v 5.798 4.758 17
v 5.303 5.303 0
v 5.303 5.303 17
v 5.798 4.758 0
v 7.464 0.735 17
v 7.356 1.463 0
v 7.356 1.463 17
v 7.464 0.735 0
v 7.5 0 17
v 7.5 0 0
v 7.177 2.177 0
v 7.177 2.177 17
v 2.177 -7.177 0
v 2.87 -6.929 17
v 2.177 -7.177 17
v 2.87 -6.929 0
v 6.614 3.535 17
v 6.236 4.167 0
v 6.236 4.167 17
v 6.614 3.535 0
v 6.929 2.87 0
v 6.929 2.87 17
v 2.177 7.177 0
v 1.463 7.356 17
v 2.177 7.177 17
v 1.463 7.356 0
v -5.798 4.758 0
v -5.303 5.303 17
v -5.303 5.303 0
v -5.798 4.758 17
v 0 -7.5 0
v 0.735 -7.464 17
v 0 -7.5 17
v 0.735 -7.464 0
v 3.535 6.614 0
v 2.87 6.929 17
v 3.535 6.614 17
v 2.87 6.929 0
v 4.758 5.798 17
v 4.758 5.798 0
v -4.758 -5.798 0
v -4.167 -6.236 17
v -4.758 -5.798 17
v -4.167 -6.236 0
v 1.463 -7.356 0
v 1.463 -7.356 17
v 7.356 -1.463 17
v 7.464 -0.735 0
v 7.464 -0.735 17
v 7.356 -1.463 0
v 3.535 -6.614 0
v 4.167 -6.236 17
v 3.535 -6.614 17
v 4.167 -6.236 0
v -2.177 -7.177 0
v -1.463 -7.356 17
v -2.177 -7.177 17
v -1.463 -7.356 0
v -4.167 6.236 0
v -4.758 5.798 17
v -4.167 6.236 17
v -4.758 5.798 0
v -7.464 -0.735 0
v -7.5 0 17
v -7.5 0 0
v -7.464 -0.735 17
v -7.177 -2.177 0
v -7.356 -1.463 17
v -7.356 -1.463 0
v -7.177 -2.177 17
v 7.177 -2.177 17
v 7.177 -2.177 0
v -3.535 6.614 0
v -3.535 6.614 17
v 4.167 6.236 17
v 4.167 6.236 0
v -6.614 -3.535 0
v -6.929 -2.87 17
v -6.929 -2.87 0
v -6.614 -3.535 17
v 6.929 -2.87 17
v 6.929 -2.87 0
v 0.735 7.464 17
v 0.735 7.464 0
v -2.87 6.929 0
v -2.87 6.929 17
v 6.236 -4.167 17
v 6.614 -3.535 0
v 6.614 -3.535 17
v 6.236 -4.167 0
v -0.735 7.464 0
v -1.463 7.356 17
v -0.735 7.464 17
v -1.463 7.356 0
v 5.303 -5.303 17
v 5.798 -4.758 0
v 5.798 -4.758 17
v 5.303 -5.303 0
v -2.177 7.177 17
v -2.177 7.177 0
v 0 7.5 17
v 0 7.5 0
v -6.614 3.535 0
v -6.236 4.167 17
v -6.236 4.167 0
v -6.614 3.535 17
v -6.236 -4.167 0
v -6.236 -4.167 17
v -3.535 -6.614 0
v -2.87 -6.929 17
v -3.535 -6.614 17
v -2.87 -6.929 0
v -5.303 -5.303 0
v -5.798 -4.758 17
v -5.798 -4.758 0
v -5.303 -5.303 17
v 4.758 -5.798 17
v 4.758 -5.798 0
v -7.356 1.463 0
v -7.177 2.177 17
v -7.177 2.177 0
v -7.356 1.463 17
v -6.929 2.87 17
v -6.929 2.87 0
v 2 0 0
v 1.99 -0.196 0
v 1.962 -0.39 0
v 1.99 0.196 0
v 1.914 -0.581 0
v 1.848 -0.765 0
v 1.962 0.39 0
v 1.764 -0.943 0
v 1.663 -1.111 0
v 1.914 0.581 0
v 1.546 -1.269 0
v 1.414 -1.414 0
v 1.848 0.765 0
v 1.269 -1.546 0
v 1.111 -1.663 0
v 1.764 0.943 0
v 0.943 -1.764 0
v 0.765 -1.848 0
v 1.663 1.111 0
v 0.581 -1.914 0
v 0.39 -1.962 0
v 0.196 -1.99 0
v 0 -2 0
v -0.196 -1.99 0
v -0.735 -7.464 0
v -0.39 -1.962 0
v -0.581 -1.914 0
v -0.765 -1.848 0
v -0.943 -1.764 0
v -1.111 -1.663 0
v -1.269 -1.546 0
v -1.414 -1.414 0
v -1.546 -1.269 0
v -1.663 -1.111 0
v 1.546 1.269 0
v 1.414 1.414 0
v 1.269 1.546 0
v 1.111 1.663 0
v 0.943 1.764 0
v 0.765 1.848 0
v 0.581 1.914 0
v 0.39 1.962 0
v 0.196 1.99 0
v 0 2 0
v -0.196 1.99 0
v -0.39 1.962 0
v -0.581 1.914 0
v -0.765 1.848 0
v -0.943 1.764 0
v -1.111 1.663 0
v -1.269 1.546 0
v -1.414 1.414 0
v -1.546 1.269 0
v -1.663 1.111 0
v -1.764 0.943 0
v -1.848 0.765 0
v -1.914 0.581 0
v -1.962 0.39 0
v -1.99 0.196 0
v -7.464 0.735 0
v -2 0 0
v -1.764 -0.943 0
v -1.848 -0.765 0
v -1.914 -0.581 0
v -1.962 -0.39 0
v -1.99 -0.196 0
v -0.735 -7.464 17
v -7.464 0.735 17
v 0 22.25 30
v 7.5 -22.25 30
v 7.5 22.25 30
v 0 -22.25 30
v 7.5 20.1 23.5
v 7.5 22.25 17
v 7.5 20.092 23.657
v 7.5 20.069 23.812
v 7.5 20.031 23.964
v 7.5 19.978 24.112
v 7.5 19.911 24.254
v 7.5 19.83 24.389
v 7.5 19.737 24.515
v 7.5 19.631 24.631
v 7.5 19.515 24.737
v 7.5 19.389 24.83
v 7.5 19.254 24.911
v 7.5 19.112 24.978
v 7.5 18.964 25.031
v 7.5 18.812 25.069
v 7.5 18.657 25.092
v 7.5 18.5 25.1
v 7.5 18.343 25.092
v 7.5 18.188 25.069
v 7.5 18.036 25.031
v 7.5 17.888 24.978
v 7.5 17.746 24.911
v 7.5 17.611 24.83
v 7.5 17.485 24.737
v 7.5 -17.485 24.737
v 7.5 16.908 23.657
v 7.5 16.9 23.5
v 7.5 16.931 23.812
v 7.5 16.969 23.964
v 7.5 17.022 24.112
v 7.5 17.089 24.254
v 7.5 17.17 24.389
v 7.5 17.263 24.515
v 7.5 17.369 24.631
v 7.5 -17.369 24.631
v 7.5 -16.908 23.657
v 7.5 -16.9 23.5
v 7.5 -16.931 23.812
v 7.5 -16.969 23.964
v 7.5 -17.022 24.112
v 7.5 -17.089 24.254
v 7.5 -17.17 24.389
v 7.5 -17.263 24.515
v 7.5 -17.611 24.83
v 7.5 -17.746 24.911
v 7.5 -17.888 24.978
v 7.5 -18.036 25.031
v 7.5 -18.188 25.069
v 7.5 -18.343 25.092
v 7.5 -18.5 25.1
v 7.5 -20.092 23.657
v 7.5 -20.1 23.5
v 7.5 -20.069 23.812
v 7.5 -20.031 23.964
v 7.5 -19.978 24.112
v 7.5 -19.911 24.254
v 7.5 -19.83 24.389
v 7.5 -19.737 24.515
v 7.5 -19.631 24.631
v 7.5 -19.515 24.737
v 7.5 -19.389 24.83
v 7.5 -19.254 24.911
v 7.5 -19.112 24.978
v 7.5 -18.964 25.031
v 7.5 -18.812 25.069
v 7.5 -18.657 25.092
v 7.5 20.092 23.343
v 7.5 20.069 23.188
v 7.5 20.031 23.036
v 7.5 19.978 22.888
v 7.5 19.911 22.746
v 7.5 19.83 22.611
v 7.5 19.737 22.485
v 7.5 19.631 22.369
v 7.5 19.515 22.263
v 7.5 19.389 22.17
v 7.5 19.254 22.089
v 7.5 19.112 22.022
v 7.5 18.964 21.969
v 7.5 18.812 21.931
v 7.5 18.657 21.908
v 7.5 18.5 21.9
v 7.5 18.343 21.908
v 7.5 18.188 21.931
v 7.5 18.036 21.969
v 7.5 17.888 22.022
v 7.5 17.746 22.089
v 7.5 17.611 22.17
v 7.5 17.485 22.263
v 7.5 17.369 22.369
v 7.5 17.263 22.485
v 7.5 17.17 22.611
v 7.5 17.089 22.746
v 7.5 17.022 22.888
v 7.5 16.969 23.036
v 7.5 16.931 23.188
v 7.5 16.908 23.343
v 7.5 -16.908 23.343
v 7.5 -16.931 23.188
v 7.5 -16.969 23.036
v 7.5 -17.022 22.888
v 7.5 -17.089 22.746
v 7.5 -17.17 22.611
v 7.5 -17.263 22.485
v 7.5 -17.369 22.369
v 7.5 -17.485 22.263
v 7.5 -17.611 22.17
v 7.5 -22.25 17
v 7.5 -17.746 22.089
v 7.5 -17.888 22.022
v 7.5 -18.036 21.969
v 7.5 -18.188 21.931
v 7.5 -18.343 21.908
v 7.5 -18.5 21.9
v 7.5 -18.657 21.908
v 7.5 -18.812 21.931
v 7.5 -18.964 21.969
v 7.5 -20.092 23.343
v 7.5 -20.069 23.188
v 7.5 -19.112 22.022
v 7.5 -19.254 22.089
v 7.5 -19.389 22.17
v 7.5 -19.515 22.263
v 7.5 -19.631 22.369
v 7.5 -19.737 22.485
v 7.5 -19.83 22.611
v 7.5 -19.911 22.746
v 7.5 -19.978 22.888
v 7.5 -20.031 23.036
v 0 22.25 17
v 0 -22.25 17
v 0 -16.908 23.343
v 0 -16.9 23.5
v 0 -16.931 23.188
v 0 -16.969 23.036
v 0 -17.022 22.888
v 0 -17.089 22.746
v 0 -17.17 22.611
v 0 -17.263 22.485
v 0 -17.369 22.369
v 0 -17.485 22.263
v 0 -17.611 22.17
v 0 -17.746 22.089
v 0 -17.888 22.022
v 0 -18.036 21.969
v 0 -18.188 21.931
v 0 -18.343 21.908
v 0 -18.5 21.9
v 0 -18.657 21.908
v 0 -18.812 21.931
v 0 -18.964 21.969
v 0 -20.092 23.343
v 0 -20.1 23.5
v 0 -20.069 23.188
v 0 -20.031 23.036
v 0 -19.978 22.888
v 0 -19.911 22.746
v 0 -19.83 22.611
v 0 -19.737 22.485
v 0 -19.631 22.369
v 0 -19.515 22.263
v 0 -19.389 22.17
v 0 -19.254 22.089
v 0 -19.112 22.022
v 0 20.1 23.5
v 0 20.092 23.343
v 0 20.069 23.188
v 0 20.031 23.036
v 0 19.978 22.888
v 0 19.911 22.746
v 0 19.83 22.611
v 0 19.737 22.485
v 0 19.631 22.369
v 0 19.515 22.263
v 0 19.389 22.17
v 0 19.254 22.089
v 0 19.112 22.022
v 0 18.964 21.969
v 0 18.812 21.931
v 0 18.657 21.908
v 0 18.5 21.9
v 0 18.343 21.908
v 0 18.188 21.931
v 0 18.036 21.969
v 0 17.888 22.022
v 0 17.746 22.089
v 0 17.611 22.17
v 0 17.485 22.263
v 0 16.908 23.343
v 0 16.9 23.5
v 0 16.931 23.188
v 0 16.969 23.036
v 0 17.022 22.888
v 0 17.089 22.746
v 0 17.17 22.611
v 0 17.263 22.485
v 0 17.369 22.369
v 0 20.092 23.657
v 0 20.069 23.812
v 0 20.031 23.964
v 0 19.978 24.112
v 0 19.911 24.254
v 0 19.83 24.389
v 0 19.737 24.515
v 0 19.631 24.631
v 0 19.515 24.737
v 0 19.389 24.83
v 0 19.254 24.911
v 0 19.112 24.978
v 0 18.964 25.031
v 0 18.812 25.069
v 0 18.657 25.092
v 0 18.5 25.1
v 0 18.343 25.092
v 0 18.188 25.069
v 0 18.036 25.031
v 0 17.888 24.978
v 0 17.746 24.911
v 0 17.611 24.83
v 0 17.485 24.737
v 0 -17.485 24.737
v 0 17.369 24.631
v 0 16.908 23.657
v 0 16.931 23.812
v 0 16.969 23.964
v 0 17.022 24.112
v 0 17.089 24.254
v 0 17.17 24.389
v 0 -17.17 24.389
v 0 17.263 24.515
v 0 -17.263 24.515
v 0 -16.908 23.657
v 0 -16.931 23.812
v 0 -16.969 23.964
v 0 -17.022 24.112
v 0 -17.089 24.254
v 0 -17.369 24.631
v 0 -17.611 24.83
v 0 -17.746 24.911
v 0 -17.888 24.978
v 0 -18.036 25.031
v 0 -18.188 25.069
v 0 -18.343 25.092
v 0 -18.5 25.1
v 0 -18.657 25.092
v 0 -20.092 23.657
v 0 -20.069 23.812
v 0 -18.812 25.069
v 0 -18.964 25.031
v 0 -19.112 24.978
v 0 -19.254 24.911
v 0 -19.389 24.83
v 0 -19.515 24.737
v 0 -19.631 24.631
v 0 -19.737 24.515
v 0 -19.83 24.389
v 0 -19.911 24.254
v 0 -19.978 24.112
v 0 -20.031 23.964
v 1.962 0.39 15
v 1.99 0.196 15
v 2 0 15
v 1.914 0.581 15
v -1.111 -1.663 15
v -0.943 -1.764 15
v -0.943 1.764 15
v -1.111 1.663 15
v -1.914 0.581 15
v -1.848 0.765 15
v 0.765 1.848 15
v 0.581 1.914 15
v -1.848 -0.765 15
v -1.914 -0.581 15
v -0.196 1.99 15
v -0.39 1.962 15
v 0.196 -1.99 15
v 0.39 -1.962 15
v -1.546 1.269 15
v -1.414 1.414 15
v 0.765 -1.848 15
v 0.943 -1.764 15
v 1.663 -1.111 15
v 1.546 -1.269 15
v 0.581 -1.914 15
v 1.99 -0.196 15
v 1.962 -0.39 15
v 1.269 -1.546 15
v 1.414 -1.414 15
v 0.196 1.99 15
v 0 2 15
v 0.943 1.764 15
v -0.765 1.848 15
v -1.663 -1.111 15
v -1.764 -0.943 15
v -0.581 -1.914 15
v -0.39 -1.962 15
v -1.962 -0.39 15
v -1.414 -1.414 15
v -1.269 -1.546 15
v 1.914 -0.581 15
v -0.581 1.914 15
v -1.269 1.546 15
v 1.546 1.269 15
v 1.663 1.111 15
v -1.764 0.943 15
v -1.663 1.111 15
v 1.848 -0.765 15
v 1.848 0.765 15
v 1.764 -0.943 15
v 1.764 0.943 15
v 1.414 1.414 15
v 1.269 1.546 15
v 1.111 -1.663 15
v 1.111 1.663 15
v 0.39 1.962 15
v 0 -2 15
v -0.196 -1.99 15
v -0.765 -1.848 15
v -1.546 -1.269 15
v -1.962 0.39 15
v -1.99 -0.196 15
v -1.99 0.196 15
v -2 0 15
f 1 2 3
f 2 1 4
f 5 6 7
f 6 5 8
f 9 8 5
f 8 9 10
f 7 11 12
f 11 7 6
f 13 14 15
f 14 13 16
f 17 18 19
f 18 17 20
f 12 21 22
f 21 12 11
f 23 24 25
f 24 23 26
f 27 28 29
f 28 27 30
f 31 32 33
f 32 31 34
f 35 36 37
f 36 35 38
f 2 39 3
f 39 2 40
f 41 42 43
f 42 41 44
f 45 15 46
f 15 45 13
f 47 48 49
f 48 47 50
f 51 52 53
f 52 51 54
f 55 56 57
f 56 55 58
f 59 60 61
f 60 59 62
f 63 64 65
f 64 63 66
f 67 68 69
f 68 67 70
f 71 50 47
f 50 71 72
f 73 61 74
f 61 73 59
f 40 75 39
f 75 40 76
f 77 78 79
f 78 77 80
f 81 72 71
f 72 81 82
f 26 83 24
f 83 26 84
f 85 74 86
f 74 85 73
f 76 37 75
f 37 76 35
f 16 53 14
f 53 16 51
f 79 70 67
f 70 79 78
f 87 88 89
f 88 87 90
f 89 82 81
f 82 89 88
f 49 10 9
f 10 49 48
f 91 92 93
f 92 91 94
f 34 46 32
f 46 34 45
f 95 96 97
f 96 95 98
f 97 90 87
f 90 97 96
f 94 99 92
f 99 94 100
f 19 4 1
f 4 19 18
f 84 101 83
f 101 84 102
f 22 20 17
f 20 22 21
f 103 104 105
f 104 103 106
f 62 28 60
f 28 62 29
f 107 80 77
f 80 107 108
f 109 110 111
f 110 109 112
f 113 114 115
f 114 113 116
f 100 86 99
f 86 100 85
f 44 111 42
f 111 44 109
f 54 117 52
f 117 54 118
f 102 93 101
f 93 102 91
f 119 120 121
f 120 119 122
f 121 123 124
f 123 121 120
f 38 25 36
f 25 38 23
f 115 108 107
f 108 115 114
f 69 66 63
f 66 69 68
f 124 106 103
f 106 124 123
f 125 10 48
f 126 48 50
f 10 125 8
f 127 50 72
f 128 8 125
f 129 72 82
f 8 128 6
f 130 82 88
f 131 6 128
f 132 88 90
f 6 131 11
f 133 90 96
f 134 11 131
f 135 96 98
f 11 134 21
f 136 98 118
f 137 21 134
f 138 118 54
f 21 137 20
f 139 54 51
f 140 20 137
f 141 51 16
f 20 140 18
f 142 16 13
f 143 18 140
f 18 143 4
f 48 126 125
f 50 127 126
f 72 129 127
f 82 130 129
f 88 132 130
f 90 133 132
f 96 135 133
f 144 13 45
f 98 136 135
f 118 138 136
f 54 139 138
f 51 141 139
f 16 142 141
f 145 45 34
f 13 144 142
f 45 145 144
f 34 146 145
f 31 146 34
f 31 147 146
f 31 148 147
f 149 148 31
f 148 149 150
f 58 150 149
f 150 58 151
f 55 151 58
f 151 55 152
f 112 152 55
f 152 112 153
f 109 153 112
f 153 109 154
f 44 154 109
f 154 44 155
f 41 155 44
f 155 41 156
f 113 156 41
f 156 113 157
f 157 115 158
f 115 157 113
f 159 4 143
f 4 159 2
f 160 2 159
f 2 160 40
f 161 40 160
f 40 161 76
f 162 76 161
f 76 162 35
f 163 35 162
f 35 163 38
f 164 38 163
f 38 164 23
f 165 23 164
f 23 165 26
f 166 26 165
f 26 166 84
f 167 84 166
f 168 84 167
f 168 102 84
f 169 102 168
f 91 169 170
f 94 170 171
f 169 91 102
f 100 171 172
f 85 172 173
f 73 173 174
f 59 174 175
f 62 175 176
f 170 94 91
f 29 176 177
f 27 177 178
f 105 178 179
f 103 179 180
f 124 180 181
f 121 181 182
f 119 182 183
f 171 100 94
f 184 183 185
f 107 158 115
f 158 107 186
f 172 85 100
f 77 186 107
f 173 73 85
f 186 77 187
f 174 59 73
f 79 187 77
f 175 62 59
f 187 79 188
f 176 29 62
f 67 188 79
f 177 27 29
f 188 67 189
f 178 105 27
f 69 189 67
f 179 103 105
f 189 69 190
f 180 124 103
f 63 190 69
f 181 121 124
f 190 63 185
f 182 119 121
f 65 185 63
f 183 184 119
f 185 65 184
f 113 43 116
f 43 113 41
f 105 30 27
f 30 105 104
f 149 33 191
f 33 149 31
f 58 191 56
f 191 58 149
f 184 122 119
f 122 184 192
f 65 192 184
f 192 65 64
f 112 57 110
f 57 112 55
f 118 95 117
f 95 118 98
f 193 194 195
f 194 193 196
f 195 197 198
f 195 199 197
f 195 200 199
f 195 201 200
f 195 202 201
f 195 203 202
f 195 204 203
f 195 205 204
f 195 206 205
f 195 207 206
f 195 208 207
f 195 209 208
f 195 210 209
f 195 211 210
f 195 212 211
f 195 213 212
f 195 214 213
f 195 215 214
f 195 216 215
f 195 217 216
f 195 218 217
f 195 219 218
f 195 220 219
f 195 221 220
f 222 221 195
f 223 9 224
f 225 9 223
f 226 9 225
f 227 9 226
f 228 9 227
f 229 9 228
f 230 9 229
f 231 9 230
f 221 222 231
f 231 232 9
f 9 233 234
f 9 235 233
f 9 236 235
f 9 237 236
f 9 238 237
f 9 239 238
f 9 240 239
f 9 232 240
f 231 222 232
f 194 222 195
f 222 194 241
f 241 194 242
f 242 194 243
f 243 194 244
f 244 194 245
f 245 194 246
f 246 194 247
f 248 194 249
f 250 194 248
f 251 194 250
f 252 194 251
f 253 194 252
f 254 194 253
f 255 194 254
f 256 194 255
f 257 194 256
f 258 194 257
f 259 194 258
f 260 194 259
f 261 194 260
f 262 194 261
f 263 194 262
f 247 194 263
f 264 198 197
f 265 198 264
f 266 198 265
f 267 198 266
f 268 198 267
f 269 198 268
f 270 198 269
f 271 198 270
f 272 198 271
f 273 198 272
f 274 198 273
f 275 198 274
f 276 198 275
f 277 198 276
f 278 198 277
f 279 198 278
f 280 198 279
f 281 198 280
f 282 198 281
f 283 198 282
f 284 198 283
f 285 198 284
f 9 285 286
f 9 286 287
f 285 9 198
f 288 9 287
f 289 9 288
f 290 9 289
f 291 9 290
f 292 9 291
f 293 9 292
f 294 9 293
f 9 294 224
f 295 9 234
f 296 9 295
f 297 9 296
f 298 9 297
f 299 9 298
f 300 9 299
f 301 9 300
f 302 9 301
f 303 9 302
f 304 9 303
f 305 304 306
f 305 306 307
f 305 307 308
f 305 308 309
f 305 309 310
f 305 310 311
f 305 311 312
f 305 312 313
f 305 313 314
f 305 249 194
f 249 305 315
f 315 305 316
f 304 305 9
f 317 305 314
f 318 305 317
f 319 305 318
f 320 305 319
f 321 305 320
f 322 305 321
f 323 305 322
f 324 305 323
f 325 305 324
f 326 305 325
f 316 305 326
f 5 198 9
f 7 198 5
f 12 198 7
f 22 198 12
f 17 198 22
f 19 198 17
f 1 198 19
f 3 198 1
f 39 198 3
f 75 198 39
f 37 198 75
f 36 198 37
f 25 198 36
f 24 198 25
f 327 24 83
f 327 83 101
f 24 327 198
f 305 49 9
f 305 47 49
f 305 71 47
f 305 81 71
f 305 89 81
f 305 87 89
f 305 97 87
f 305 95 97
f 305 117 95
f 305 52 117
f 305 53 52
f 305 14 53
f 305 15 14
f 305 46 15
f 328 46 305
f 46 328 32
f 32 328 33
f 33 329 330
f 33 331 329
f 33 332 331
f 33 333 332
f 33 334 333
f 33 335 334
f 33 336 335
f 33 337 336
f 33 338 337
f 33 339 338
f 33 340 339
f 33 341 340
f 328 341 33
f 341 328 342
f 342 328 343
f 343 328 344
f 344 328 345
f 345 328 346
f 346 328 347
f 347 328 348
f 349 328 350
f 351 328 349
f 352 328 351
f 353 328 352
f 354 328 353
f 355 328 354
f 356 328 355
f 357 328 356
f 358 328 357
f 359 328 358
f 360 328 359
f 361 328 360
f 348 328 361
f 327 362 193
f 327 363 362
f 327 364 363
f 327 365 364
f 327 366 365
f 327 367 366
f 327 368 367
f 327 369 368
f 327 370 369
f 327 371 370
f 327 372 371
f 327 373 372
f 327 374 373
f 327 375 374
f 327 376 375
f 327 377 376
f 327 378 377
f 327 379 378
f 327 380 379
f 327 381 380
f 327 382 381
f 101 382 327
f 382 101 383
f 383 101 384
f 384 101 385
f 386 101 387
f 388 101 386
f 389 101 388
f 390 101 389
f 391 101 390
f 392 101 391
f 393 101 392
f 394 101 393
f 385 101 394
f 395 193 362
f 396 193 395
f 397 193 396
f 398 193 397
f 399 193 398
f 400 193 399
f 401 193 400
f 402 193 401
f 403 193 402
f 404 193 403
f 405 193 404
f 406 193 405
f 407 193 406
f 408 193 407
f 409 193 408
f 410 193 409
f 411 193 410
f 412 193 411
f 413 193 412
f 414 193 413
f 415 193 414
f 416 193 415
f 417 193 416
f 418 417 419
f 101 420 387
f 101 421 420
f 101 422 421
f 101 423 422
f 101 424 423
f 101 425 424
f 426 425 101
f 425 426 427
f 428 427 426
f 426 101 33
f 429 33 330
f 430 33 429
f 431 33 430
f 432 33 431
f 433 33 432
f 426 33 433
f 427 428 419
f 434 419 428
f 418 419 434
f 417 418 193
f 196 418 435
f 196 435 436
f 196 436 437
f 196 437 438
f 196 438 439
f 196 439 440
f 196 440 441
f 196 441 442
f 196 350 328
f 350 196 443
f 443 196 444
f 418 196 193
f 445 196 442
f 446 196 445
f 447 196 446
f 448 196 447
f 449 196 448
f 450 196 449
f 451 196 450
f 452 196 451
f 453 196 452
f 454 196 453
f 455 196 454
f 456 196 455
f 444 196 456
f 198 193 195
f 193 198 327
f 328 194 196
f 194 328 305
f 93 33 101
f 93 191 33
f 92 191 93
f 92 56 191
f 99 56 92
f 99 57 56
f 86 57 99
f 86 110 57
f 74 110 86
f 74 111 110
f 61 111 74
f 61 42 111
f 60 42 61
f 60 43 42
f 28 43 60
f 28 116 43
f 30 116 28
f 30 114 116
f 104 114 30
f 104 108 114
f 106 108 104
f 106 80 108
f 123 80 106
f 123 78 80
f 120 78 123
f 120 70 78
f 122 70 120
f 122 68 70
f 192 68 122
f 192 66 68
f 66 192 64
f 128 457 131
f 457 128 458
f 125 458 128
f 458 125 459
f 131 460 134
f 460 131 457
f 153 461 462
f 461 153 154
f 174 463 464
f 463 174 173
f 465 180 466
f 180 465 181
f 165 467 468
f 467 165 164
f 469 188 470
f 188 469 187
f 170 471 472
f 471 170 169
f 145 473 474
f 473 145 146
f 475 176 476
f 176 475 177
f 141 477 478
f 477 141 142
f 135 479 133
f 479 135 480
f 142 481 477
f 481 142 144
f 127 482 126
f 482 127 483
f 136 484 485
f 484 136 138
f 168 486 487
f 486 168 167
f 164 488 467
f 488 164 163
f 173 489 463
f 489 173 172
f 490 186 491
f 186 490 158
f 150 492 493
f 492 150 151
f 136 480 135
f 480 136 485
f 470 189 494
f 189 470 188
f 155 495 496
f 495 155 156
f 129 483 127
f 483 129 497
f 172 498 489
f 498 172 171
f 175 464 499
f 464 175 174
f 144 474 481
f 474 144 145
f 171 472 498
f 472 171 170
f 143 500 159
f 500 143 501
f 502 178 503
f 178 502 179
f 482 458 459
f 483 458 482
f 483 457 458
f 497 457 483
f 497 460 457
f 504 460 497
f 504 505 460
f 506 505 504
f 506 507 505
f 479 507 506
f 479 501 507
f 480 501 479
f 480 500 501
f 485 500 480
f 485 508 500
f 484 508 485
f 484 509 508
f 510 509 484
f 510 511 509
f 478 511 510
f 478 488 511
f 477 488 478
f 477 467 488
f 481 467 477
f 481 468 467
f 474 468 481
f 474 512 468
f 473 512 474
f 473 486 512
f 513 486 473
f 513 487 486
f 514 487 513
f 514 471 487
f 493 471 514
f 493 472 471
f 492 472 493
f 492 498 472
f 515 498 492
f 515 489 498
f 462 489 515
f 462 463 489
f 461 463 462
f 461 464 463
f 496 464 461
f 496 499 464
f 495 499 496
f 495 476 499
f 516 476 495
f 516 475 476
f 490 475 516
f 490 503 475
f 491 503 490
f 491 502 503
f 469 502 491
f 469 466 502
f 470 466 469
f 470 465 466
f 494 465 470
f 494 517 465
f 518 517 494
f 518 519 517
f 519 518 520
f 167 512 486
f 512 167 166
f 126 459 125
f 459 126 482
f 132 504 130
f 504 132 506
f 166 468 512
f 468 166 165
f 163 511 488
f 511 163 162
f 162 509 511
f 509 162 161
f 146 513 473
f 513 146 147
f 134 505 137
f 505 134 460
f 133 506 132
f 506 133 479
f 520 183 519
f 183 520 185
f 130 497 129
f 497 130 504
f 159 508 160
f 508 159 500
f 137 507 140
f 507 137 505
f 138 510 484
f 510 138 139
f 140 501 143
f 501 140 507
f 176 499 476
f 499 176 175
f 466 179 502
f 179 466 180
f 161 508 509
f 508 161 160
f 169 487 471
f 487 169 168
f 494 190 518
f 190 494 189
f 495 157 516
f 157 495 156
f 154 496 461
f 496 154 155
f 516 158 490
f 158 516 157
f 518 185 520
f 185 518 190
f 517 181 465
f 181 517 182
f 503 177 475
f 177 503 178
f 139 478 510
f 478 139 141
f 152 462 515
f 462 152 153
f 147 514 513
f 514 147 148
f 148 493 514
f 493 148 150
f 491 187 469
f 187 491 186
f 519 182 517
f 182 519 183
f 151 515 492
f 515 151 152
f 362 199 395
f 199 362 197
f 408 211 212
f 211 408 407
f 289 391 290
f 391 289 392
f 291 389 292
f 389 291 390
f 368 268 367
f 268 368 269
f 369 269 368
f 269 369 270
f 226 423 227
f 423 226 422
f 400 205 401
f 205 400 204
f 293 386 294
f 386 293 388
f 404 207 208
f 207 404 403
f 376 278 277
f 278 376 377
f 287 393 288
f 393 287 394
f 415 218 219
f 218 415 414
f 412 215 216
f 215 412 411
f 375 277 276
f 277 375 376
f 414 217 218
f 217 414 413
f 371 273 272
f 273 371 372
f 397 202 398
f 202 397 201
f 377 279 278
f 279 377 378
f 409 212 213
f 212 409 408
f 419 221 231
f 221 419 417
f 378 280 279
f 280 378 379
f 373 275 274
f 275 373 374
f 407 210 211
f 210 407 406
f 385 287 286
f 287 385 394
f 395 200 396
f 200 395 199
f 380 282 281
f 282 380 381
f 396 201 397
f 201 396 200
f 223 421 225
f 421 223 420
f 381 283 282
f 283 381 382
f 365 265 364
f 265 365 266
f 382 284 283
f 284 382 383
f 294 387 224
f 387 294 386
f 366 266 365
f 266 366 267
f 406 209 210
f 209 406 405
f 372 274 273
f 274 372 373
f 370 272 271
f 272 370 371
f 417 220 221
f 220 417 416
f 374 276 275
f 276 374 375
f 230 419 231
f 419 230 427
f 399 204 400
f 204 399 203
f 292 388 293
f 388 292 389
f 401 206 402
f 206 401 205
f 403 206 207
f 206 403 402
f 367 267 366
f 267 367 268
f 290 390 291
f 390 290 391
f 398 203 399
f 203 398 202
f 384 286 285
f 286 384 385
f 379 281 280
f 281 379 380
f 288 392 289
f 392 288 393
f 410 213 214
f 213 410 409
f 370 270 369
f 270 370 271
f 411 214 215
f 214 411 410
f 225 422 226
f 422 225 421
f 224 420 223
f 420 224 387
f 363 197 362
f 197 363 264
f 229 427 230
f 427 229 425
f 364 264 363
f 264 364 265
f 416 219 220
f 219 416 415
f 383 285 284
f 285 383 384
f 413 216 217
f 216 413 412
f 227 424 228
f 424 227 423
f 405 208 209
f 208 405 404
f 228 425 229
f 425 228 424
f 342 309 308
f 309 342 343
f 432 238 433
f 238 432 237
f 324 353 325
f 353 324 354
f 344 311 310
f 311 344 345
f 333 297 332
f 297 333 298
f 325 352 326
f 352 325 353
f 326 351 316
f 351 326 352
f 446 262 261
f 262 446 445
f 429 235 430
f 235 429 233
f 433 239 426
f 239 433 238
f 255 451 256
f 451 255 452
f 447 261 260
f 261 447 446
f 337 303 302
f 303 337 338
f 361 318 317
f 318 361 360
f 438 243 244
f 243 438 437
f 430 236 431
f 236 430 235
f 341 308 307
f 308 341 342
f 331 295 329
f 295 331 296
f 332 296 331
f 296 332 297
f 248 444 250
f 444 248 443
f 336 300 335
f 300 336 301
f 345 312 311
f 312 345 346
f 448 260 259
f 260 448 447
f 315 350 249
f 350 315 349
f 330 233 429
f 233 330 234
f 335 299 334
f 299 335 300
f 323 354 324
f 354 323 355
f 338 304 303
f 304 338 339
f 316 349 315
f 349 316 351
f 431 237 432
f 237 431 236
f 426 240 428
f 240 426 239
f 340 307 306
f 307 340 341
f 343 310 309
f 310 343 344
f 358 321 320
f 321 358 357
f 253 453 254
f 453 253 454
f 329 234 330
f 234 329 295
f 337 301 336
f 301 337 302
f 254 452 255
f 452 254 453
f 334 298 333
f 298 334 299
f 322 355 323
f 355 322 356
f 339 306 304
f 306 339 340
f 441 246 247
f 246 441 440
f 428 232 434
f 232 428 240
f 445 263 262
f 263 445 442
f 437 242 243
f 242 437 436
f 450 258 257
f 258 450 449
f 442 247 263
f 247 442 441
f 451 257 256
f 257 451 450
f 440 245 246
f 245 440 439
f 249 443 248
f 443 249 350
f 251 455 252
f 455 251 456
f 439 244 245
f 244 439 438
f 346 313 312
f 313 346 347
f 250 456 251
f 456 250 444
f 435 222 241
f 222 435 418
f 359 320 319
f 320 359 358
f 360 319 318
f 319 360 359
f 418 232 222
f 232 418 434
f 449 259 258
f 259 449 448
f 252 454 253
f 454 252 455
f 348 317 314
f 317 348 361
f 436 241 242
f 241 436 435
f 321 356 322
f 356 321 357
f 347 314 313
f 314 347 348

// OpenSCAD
// sharp distance sensor stepper coupler
/* [Hidden] */
$fn =64;

/* [General coupler dimensions] */
// stepper shaft diameter
d_shaft_stepper = 4;
// coupler height
h_coupler = 30;
// coupler external diameter
D_coupler = 15;
/* [Sharp sensor dimensions] */
// distance between bolts
l_bolts_sharp = 37;
// bolts diameter
d_bolt_sharp = 3.2;
// bolt setling diameter
D_bolt_sharp = 7.5;
// sensor heigth
h_sharp = 13.5;
// sensor weigth
w_sharp = 13;
// sensor length
l_sharp = l_bolts_sharp + D_bolt_sharp;


difference(){
    union(){
        cylinder(r = D_coupler/2, h = h_coupler,center = [0, 0, h_coupler/2]);
        translate([D_coupler/4,0,h_coupler-w_sharp/2])
            cube([D_coupler/2,l_sharp,w_sharp], center = true);
    }
    translate([-D_coupler/4,0,h_coupler-w_sharp/2])
            cube([D_coupler/2,l_sharp,w_sharp], center = true);
    cylinder(r = d_shaft_stepper/2, h = h_coupler/2, center = [0, 0, h_coupler/4]);
    translate([D_coupler/4, l_bolts_sharp/2, h_coupler-w_sharp/2])
        rotate([0,90,0])
            #cylinder(r = d_bolt_sharp/2, h = D_coupler/2, center = true);
    translate([D_coupler/4, -l_bolts_sharp/2, h_coupler-w_sharp/2])
        rotate([0,90,0])
            #cylinder(r = d_bolt_sharp/2, h = D_coupler/2, center = true);
}
